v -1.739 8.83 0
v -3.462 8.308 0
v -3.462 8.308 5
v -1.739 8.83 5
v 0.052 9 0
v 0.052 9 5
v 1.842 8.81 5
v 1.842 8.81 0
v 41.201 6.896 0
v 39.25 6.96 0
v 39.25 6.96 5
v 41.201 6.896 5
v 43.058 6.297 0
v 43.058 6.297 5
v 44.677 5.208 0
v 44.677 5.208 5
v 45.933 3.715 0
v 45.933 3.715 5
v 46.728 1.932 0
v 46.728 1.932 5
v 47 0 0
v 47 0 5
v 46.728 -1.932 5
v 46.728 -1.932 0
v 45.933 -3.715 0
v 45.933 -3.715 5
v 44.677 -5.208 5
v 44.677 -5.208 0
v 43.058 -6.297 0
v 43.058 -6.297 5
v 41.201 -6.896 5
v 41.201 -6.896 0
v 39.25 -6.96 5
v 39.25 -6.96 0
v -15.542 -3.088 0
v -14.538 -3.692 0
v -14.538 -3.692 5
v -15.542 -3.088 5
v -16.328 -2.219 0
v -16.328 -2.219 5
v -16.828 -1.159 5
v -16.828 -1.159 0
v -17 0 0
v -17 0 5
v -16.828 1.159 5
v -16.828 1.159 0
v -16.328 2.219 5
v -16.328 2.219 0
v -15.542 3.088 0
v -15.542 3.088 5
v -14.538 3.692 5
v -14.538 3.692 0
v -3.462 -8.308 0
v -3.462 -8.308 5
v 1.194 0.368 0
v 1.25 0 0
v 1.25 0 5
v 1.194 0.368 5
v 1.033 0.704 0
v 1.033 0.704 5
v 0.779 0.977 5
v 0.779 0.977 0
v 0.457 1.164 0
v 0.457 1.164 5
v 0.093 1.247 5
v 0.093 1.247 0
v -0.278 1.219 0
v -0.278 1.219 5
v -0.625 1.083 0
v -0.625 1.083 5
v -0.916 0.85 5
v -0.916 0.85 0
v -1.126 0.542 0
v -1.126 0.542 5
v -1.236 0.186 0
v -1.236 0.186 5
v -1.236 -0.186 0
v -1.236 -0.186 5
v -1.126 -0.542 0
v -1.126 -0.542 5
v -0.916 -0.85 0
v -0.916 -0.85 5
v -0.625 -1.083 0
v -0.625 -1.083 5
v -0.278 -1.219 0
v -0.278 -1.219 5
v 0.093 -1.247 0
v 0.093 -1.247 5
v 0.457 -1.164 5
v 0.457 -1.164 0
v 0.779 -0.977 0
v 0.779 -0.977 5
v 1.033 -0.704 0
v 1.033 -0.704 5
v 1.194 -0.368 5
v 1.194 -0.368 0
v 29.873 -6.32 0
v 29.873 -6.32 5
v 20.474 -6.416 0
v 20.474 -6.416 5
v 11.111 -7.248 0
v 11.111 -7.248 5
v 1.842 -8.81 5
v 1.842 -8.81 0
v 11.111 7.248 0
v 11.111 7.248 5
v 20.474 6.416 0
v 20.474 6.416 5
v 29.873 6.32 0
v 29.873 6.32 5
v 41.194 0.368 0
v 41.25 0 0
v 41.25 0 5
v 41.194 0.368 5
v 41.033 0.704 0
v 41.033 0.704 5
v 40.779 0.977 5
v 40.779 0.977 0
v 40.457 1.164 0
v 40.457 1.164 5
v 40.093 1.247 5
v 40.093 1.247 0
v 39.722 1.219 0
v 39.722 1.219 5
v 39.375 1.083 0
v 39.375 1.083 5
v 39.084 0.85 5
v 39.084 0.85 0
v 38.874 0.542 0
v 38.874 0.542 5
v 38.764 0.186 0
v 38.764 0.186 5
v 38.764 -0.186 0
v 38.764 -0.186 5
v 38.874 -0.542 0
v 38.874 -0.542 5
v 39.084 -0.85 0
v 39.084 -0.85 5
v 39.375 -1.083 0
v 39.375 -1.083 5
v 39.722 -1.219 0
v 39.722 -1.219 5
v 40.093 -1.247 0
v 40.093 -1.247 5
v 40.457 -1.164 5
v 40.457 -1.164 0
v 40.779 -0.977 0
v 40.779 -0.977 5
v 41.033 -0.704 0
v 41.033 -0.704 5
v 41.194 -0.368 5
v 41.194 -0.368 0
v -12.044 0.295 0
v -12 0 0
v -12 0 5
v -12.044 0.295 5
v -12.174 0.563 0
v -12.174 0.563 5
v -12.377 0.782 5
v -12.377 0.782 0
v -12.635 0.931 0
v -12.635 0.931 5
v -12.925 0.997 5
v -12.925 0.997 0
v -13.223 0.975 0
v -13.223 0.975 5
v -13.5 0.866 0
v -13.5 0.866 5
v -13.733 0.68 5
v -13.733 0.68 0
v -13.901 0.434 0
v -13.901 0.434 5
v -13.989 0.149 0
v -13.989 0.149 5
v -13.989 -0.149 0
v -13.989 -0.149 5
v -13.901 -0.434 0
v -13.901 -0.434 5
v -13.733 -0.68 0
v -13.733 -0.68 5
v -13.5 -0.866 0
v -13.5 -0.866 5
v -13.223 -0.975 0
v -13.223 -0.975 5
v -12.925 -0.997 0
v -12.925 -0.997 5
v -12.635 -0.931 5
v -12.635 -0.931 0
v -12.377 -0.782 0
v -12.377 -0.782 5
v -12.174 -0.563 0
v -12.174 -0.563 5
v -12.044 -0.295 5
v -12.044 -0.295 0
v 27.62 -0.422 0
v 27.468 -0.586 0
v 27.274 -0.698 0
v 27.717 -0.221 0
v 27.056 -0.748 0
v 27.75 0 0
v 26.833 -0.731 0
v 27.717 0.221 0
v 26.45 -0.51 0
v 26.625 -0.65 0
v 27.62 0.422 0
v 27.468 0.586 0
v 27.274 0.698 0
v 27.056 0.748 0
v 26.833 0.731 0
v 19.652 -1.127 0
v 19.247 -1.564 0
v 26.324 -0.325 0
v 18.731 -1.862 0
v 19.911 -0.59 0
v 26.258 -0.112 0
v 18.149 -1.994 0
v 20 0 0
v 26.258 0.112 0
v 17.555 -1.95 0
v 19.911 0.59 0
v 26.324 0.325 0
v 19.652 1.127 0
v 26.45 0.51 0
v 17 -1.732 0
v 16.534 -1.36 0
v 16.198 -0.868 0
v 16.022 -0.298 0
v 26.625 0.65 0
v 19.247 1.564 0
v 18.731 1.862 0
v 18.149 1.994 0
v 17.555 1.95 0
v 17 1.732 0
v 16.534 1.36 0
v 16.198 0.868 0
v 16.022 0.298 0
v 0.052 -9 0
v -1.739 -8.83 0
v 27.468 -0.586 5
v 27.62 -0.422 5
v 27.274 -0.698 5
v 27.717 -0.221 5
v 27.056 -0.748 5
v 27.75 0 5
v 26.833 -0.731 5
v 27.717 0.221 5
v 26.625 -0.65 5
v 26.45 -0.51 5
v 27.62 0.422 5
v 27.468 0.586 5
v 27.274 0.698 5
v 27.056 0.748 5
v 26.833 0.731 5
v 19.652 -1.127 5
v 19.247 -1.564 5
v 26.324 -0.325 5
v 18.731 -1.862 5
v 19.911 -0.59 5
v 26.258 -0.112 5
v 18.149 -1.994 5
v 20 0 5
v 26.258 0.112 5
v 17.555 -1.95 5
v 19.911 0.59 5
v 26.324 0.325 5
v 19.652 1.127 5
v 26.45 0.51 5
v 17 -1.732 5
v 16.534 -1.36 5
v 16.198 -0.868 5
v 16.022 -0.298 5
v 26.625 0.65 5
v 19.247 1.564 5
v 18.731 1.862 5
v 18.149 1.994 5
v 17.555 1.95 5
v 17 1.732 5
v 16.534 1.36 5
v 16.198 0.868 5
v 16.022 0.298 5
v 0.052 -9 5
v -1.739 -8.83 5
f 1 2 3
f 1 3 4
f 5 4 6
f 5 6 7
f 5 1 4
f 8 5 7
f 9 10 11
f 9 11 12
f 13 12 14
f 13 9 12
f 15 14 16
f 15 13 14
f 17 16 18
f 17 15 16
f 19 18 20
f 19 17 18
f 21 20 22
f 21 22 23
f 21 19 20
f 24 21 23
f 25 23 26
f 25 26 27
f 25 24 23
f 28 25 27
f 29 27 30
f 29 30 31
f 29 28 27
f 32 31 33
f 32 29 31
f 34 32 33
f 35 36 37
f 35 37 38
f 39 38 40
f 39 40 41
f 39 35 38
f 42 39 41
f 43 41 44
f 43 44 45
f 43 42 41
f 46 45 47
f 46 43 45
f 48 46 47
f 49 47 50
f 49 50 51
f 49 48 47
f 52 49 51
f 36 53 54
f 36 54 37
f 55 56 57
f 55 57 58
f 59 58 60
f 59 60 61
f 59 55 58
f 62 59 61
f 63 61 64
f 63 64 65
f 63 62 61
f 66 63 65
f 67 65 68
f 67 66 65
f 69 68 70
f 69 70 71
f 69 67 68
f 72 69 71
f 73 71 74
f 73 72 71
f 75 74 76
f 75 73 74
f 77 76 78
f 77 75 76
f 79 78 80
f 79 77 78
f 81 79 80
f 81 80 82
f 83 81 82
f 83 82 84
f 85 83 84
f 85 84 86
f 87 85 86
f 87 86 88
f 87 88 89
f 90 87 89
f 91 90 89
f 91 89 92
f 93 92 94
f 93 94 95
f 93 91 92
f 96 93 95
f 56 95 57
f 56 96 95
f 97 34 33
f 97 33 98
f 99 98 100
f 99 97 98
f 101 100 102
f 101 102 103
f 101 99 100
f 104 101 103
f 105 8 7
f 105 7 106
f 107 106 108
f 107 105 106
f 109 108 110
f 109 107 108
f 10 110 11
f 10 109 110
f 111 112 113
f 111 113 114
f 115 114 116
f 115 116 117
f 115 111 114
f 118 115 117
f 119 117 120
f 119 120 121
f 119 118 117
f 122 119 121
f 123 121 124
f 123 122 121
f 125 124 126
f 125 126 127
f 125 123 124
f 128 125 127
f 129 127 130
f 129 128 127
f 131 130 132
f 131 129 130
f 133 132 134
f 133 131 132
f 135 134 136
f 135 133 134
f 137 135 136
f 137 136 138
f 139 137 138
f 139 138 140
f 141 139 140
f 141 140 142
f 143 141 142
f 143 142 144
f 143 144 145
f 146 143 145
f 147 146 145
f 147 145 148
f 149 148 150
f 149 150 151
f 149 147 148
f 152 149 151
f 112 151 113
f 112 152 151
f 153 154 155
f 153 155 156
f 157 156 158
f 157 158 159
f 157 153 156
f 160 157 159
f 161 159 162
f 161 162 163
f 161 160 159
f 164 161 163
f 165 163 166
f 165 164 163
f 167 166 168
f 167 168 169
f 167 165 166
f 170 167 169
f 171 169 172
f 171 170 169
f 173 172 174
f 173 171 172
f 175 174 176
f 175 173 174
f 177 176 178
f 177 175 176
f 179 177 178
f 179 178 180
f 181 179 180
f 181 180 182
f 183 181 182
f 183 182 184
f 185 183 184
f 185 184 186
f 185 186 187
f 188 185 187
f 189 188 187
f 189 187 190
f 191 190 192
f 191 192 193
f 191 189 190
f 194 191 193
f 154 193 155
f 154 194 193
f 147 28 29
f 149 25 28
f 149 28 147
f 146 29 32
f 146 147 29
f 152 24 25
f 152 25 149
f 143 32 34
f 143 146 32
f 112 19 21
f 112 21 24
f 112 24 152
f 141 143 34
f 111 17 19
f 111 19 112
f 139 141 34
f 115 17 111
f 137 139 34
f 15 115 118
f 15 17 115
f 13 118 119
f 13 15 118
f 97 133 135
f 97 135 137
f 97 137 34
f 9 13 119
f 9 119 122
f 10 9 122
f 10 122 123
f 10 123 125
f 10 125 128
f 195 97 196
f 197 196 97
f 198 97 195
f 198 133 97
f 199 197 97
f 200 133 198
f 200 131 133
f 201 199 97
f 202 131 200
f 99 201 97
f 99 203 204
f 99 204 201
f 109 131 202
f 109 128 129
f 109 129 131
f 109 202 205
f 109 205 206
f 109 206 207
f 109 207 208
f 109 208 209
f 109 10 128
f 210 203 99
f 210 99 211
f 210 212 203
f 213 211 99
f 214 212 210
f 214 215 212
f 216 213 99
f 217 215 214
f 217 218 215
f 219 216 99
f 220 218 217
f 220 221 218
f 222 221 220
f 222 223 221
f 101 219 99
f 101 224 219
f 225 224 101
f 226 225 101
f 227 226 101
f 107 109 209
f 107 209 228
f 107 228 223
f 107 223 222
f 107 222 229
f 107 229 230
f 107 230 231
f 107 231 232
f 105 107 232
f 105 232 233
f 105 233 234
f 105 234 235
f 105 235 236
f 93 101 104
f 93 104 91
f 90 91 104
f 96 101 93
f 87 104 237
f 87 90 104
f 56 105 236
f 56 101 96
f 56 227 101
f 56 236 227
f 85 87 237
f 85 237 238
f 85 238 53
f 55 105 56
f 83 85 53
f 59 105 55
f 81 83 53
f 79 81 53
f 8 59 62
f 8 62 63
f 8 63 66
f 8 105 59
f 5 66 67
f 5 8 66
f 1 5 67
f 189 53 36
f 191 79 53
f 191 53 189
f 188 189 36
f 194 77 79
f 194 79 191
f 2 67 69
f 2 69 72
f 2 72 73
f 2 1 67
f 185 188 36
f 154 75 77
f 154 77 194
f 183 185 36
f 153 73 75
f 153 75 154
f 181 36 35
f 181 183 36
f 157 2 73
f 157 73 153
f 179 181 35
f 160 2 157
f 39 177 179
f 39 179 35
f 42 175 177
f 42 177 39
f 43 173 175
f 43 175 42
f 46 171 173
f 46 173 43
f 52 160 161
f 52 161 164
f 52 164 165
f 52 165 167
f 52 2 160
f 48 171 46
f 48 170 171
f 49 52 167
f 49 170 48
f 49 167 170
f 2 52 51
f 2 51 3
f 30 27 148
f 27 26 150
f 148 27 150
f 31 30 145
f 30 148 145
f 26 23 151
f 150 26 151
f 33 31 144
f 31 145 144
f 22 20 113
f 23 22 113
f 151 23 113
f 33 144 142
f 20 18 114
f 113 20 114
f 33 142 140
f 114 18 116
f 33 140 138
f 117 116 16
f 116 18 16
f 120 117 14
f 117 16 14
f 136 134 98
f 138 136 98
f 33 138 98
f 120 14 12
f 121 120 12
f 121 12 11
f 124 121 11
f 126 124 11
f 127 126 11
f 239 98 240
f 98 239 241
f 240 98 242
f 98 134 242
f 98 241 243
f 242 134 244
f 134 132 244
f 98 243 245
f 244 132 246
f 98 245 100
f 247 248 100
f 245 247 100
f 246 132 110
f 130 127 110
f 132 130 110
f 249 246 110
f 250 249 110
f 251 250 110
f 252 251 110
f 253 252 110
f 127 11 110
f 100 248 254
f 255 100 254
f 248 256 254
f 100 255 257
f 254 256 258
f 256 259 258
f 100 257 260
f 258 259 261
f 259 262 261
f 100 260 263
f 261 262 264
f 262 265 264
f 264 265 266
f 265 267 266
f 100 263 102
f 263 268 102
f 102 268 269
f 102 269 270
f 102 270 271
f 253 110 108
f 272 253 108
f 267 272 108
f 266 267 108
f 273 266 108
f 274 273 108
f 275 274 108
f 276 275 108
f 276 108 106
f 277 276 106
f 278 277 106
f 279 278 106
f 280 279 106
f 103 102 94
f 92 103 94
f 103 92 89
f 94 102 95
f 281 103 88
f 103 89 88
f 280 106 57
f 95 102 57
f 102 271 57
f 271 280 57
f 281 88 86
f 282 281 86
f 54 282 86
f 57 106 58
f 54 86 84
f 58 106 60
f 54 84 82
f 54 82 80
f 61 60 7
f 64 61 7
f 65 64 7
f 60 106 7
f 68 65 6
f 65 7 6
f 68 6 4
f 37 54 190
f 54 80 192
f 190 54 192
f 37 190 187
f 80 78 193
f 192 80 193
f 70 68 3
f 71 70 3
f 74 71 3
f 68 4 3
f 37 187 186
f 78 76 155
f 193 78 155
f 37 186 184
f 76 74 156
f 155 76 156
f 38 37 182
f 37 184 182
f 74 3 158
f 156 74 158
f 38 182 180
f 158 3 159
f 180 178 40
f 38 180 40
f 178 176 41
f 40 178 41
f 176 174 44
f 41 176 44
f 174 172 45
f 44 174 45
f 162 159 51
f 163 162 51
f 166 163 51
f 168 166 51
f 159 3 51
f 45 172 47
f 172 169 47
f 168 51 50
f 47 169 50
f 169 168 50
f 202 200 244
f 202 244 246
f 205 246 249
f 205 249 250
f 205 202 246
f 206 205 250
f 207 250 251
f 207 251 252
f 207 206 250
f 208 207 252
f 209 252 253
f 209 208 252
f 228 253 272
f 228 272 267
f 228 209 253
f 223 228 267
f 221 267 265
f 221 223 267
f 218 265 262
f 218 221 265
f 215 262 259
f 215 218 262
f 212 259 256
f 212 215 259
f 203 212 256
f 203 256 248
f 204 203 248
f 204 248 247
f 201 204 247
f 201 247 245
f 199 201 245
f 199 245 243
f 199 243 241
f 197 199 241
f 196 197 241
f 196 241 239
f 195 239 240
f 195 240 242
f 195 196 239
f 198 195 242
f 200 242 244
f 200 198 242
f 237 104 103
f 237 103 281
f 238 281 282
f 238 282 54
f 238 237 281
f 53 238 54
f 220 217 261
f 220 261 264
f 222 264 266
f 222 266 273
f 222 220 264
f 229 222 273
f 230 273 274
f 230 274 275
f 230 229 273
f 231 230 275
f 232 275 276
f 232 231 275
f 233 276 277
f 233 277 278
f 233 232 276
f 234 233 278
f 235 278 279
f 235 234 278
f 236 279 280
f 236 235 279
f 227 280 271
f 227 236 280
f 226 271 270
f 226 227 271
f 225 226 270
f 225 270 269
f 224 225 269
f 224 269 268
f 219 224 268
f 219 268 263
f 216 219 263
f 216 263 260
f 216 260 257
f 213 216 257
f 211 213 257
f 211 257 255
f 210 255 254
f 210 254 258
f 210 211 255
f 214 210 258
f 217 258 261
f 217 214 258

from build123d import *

# Parameters (mm, degrees)
SKETCH1_R           = 1.25
SKETCH1_R_2         = 1
SKETCH1_R_3         = 2
SKETCH1_R_4         = 0.75
BOSS_EXTRUDE1_DEPTH = 5


with BuildPart() as part:
    # Sketch1 → Boss-Extrude1 (new body)
    with BuildSketch(Plane.XY):
        with BuildLine():
            Line((-14.538461538, 3.692307692), (-3.461538462, 8.307692308))
            ThreePointArc((-3.461538462, 8.307692308), (-0.847818166, 8.959977922), (1.841860465, 8.809514744))
            ThreePointArc((1.841860465, 8.809514744), (20.473513899, 6.416147504), (39.250393701, 6.959747869))
            ThreePointArc((39.250393701, 6.959747869), (47, 0), (39.250393701, -6.959747869))
            ThreePointArc((39.250393701, -6.959747869), (20.473513899, -6.416147504), (1.841860465, -8.809514744))
            ThreePointArc((1.841860465, -8.809514744), (-0.847818166, -8.959977922), (-3.461538462, -8.307692308))
            Line((-3.461538462, -8.307692308), (-14.538461538, -3.692307692))
            ThreePointArc((-14.538461538, -3.692307692), (-17, 0), (-14.538461538, 3.692307692))
        make_face()
        Circle(SKETCH1_R, mode=Mode.SUBTRACT)
        with Locations((40, 0)):
            Circle(SKETCH1_R, mode=Mode.SUBTRACT)
        with Locations((-13, 0)):
            Circle(SKETCH1_R_2, mode=Mode.SUBTRACT)
        with Locations((18, 0)):
            Circle(SKETCH1_R_3, mode=Mode.SUBTRACT)
        with Locations((27, 0)):
            Circle(SKETCH1_R_4, mode=Mode.SUBTRACT)
    extrude(amount=BOSS_EXTRUDE1_DEPTH)


solid = part.part
